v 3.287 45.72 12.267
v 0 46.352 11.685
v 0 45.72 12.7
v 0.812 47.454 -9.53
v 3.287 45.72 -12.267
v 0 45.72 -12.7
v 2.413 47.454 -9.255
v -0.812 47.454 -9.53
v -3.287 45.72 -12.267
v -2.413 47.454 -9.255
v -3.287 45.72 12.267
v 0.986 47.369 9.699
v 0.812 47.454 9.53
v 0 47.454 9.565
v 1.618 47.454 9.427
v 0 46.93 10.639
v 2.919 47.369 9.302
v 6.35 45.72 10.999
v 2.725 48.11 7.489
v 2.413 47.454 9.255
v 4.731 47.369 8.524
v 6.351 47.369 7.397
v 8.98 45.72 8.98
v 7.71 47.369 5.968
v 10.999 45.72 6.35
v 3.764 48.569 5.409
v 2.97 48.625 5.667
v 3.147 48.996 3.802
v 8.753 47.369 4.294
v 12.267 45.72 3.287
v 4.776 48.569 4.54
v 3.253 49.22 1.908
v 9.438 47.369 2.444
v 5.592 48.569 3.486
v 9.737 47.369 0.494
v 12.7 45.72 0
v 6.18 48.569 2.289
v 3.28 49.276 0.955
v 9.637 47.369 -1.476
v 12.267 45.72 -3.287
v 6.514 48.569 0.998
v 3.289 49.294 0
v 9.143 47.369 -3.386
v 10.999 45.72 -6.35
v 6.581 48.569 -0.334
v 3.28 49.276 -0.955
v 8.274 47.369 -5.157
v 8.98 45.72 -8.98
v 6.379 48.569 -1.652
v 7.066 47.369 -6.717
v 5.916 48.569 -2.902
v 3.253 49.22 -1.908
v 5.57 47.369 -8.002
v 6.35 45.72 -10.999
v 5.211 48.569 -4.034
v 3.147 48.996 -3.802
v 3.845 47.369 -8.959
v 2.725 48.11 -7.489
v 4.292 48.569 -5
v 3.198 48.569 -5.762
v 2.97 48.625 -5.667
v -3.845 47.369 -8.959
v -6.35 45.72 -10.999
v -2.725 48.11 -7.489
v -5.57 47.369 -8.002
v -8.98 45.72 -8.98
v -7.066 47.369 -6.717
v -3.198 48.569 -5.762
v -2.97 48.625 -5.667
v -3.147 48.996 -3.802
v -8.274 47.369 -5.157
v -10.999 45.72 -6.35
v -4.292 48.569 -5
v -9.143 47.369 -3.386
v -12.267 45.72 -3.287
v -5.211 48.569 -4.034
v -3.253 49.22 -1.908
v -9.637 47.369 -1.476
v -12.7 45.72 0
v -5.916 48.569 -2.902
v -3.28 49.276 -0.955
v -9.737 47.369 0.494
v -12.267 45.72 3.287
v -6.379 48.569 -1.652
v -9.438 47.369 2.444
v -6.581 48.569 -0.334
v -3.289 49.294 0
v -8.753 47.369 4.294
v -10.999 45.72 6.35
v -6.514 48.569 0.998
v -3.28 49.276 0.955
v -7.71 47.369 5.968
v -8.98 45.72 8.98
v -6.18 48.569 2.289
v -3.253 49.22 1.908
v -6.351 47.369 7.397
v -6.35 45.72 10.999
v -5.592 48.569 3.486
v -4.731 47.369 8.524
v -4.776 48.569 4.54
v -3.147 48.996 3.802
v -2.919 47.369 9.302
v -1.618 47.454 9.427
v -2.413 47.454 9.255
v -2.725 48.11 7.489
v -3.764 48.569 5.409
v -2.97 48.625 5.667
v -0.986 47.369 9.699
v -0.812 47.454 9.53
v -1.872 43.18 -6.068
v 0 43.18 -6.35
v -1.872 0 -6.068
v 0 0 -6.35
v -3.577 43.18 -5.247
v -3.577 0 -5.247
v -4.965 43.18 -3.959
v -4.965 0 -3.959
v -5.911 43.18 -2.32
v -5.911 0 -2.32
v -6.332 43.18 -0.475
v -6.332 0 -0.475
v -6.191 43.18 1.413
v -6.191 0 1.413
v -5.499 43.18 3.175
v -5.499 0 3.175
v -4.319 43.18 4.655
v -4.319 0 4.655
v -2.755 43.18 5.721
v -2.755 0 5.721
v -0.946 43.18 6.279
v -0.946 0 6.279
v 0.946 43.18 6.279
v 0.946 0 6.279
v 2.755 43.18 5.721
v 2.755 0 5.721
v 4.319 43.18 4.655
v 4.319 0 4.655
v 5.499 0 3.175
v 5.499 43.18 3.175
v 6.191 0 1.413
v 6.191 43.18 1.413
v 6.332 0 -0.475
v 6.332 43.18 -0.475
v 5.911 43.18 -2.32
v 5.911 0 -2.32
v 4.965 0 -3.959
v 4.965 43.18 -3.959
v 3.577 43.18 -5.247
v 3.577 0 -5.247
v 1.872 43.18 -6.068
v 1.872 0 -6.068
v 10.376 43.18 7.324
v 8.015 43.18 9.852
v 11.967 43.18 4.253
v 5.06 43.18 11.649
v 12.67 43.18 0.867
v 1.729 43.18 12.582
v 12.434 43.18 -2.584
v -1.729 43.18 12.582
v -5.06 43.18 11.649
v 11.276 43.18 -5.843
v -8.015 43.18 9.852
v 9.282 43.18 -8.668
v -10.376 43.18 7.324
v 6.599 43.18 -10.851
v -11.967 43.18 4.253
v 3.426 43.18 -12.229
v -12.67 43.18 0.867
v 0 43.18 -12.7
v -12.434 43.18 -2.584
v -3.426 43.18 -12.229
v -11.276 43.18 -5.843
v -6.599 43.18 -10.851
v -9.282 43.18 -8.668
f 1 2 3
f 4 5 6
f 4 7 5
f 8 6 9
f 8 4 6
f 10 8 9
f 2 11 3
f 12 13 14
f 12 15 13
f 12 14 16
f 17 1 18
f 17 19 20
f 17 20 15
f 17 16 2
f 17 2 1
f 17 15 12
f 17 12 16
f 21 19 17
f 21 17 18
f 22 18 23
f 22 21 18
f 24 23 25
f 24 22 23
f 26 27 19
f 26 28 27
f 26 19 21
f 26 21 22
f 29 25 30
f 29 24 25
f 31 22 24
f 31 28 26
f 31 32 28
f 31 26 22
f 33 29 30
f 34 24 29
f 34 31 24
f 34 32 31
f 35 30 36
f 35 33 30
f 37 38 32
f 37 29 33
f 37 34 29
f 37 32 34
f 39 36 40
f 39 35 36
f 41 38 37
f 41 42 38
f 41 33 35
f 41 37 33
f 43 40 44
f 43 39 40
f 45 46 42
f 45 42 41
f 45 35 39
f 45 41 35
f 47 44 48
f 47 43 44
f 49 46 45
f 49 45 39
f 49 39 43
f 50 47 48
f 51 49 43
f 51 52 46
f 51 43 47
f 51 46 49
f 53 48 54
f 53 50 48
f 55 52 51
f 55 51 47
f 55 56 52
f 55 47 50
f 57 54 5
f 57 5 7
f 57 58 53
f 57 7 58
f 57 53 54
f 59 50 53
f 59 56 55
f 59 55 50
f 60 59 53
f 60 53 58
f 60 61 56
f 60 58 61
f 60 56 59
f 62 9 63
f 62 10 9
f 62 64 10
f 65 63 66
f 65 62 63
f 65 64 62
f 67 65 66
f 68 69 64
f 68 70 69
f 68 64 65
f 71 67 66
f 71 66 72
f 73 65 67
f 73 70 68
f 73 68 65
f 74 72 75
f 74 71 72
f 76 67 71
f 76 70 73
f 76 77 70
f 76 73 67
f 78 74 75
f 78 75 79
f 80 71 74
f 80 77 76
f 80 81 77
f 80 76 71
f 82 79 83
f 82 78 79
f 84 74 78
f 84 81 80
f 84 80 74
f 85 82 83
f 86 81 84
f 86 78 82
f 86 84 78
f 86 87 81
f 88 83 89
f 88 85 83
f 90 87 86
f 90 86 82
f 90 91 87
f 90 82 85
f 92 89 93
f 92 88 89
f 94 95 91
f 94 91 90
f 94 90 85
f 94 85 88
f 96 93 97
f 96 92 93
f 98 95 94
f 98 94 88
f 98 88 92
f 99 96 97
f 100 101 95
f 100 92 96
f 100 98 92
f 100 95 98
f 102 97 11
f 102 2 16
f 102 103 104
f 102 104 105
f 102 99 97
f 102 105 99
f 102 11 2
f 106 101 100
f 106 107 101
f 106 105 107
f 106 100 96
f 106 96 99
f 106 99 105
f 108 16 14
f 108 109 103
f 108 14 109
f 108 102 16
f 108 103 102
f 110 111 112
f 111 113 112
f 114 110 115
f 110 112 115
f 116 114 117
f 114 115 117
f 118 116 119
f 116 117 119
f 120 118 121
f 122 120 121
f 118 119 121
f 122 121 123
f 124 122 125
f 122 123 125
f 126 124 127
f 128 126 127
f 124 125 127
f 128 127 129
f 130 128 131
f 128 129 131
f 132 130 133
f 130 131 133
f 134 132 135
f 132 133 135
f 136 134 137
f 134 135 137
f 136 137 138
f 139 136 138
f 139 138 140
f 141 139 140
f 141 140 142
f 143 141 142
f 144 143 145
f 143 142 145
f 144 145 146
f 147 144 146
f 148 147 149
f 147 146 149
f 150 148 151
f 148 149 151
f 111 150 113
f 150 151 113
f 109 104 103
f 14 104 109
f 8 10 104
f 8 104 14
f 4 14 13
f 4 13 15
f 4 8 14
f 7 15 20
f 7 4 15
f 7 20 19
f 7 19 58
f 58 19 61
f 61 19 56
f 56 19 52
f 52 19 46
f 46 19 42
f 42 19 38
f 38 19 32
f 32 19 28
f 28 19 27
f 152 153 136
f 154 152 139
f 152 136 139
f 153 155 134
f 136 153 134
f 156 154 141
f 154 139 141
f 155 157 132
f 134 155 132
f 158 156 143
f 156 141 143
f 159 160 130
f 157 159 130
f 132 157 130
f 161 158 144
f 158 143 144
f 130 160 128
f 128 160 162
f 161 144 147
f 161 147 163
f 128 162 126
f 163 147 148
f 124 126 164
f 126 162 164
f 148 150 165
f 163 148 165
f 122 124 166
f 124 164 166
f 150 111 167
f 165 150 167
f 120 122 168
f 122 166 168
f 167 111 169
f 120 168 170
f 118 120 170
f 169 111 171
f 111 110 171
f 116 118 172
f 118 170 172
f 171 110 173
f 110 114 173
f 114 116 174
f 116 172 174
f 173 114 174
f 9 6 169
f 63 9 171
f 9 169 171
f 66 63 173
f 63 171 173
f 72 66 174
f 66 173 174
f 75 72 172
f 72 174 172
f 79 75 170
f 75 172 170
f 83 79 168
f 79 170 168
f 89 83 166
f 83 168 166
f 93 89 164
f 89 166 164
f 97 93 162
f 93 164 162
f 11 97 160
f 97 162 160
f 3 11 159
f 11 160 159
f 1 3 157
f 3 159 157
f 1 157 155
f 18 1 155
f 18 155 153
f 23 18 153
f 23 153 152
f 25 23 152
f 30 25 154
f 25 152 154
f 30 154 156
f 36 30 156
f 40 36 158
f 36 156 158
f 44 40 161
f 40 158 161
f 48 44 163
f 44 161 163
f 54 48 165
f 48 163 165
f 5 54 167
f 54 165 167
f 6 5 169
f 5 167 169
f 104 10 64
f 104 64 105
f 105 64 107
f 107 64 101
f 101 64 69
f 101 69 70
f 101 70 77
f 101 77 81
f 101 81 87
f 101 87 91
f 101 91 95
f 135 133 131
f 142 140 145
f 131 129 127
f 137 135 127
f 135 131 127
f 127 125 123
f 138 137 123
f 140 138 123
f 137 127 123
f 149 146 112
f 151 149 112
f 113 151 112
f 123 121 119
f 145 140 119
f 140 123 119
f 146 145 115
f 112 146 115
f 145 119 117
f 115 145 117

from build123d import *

# Parameters (mm, degrees)
DOME1_FACE_RADIUS       = 12.7
DOME1_HEIGHT            = 3.81
CUT_EXTRUDE1_DEPTH      = 53.685870022
CUT_EXTRUDE1_DEPTH_BACK = 53.685870022


with BuildPart() as part:
    # Sketch1 → Revolve2 (revolve)
    with BuildSketch(Plane.XY, mode=Mode.PRIVATE) as revolve2_sk:
        Polygon((0, 0), (0, 45.72), (-12.7, 45.72), (-12.7, 43.18), (-6.35, 43.18), (-6.35, 0), (-0.453180755, 0), align=None)
    revolve(revolve2_sk.sketch.rotate(Axis((0, 0, 0), (0, 1, 0)), 270), axis=Axis((0, 0, 0), (0, 1, 0)))

    # Dome1: a dome of height H over a round flat face of radius A is a cap of a sphere of radius (A * A + H * H) / (2 * H)
    dome1_r = (DOME1_FACE_RADIUS * DOME1_FACE_RADIUS + DOME1_HEIGHT * DOME1_HEIGHT) / (2 * DOME1_HEIGHT)
    dome1_base = Plane((0, 45.72, 0), z_dir=(0, 1, 0))
    with Locations(dome1_base.offset(DOME1_HEIGHT - dome1_r)):
        dome1_ball = Sphere(dome1_r, mode=Mode.PRIVATE)
    add(split(dome1_ball, bisect_by=dome1_base, keep=Keep.TOP, mode=Mode.PRIVATE))

    # Sketch2 → Cut-Extrude1 (cut, two sides: drawn at the far end of the back side and taken through both)
    with BuildSketch(Plane.XY.offset(-CUT_EXTRUDE1_DEPTH_BACK)):
        Polygon((7.09988746, 57.306992364), (-7.09988746, 57.306992364), (-2.413050327, 47.453982482), (2.413050327, 47.453982482), align=None)
    extrude(amount=CUT_EXTRUDE1_DEPTH + CUT_EXTRUDE1_DEPTH_BACK, mode=Mode.SUBTRACT)


solid = part.part
